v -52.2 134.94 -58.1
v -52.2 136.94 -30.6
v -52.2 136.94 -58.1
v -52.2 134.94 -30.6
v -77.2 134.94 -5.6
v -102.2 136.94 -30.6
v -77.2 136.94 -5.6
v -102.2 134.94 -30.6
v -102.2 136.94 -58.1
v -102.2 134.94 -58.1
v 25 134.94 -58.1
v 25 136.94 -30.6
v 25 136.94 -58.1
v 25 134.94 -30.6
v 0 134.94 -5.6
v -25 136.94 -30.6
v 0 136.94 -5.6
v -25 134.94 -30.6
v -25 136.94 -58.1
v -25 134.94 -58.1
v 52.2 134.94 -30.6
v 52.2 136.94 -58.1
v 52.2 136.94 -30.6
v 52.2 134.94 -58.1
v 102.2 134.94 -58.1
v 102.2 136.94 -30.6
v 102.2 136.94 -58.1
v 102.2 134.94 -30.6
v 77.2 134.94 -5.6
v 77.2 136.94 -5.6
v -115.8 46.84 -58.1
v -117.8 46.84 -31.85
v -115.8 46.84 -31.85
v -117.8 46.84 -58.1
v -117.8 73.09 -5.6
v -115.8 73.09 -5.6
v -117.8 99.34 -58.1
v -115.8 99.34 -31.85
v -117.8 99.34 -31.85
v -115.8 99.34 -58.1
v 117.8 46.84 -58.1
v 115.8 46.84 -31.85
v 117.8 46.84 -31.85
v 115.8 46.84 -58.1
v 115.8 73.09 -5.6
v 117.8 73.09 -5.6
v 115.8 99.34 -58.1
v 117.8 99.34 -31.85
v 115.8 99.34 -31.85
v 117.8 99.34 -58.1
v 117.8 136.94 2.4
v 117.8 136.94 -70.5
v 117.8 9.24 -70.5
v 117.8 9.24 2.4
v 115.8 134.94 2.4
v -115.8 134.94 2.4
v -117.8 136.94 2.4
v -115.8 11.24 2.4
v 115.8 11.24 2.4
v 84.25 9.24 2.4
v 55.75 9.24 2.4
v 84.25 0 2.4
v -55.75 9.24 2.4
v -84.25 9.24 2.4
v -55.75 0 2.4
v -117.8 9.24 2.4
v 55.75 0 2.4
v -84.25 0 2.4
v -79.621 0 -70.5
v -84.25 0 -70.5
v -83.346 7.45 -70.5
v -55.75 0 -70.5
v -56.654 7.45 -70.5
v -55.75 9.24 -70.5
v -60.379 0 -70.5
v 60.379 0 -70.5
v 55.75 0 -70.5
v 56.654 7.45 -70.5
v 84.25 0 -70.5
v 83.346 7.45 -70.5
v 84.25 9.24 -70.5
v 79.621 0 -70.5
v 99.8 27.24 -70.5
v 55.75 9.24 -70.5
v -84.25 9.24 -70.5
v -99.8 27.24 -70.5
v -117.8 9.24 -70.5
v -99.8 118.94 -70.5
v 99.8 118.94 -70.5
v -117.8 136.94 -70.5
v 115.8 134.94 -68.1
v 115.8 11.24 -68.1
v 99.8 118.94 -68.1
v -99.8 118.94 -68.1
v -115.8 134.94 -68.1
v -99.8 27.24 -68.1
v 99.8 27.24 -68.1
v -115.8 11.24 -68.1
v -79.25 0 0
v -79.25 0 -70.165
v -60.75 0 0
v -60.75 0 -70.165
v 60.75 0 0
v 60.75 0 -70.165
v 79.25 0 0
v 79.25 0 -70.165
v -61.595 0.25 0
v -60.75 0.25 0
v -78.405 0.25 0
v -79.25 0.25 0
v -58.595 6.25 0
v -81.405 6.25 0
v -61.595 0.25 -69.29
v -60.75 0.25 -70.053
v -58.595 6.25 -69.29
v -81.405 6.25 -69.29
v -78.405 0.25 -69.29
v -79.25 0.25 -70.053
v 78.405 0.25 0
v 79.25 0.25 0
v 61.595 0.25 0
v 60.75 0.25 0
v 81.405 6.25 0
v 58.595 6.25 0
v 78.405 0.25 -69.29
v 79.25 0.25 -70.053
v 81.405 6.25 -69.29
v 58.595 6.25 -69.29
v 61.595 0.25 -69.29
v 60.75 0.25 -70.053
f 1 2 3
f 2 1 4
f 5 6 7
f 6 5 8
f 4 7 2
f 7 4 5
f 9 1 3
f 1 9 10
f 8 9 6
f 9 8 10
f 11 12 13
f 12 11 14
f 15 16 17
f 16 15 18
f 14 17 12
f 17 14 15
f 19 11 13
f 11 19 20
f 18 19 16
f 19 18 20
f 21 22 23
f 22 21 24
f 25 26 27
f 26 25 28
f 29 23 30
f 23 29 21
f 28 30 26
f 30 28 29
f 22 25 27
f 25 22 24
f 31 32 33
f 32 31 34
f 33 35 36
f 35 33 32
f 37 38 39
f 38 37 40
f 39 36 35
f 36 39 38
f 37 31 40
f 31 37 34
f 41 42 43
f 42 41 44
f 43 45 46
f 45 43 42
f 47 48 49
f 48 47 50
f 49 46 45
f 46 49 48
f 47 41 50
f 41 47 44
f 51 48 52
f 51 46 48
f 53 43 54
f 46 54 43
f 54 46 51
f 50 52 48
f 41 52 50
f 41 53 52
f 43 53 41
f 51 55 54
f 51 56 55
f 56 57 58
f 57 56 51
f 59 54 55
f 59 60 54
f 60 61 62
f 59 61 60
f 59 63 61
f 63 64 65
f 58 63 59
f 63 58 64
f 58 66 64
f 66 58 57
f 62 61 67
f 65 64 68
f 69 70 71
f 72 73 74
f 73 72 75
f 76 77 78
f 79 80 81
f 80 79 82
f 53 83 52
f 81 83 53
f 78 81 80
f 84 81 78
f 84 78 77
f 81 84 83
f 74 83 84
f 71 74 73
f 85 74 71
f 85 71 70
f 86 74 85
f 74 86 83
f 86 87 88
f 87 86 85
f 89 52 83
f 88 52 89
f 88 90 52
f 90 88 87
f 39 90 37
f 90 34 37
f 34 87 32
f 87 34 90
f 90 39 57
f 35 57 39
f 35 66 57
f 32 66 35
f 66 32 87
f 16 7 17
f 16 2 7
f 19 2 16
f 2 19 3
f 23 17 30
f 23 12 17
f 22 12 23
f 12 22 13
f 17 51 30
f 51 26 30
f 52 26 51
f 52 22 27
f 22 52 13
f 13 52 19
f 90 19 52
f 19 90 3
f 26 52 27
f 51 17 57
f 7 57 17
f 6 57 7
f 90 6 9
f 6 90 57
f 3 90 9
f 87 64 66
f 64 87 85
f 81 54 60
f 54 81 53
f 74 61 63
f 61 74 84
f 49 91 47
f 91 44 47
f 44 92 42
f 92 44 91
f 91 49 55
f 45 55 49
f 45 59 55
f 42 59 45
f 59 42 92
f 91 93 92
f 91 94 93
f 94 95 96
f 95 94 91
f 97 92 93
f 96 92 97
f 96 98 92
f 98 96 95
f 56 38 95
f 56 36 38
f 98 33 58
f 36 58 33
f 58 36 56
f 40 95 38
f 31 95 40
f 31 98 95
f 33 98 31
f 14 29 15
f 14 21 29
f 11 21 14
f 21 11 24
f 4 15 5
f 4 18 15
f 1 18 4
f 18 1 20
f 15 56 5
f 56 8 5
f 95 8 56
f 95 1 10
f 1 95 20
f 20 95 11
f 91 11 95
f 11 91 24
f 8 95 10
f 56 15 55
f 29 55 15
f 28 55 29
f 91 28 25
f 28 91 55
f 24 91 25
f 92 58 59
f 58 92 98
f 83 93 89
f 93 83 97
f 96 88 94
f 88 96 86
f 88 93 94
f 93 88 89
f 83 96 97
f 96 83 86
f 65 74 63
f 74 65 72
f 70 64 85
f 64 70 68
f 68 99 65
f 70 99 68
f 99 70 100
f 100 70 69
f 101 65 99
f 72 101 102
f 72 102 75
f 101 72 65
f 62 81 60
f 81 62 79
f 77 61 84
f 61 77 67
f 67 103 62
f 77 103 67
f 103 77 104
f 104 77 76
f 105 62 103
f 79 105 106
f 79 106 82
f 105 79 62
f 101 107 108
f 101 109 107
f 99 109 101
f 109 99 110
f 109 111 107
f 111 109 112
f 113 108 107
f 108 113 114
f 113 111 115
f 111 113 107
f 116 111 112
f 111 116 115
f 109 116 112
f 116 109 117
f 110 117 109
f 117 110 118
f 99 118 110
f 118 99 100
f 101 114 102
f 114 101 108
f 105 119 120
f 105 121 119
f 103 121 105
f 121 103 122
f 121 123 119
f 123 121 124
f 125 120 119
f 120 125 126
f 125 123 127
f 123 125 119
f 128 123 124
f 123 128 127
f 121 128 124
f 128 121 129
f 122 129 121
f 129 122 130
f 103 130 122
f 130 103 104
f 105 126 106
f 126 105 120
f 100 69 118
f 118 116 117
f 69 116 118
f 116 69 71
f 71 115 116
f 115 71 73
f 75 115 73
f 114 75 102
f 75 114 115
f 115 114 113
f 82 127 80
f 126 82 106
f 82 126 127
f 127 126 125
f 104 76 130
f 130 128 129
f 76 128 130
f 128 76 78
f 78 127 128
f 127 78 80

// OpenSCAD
// file: rail-clip.scad
// Bunk rail system, shared library.
//
// A rail clip hooks over a bed's top guardrail rail. Its plate carries a
// vertical dovetail tail; every accessory (cup, tissue box, cubby, and
// later a wardrobe rod or hooks) has a matching socket on its back. The
// socket is open at the bottom and capped by a roof at the top: you lower
// the accessory from above, the tail enters through the socket's bottom
// mouth, and the roof comes down onto the tail's top end. Weight and a
// dropped cup push the roof harder onto the tail, so a load can't slide
// the accessory off; only lifting it does. Wide accessories take two or
// more clips.
//
// (Before 2026-11-12 the stop was a floor at the socket's bottom, which
// meant the accessory went on by being pushed UP and any downward load
// slid it off. pipeline/print-check's retention check now fails that.)
//
// Defaults are the owner's caliper readings (2026-11-08) of a Bellemave
// twin low loft (FST00301-TB-AH): top rail 20.74 front-to-back x 20.38
// tall, lower rails about 15.5 tall x 20.18, 80.54 from the top rail's
// bottom to the next rail's top. The owner reports the rails are 80 apart
// all the way down.
//
// Clip axes: X runs along the rail, Y points away from the rail toward
// the accessory, Z is up. The top rail's bottom face is z = 0 and its
// accessory-side face is y = 0. Inside or outside the bed is the same
// part turned the other way round.
//
// Accessory axes: X along the rail, Y away from the clip, Z up. The
// accessory's back face is y = 0 and the underside of the socket roof
// (where the tail's top end bears) is z = 0. The roof is z = 0 to
// dt_roof(); the accessory hangs below.

// ---- dovetail interface (keep these fixed so all parts interchange) ----
function dt_base() = 16;    // tail width at the plate
function dt_tip() = 22;     // tail width at its face
function dt_depth() = 6;    // how far the tail stands off the plate
function dt_wall() = 3;     // accessory material around the socket
function dt_roof() = 2.4;   // socket roof over the tail's top end; carries the load
function dt_block_w(c) = dt_tip() + 2 * c + 2 * dt_wall();
function dt_block_d(c) = dt_depth() + c + dt_wall();

module dt_profile() {
  polygon([[-dt_base() / 2, 0], [dt_base() / 2, 0],
           [dt_tip() / 2, dt_depth()], [-dt_tip() / 2, dt_depth()]]);
}

// male tail on the clip, standing on y = 0, from z0 to z1
module dt_tail(z0, z1) {
  translate([0, 0, z0]) linear_extrude(z1 - z0) dt_profile();
}

// socket cut, clearance c on every mating face, open through y < 0
module dt_socket(z0, z1, c) {
  translate([0, 0, z0]) linear_extrude(z1 - z0) union() {
    offset(delta = c) dt_profile();
    translate([-dt_base() / 2 - c - 1, -1]) square([dt_base() + 2 * c + 2, 1 + c]);
  }
}

// Give an accessory its mount block(s) and socket(s). Children are the
// accessory body, starting at y = dt_block_d(c). The block runs from
// z = -h up to the roof's top (dt_roof()); its socket is open at the
// bottom and stops at the roof. h is how much tail the socket takes; a
// longer tail just shows below the block. xs are the socket centers along
// X (a clip each).
module with_mounts(h, c = 0.25, xs = [0]) {
  bw = dt_block_w(c);
  bd = dt_block_d(c);
  assert(h >= 30, str("with_mounts: only ", h, " mm of tail engaged; 30 is the minimum"));
  difference() {
    union() {
      children();
      for (x = xs) translate([x - bw / 2, 0, -h]) cube([bw, bd + 0.01, h + dt_roof()]);
    }
    for (x = xs) translate([x, 0, 0]) dt_socket(-h - 1, 0, c);
    // 45 deg lead-in chamfer at each socket's bottom mouth
    for (x = xs) translate([x, 0, 0]) hull() {
      translate([0, 0, -h - 0.01]) linear_extrude(0.01) offset(delta = c + 1.2) dt_profile();
      translate([0, 0, -h + 1.2]) linear_extrude(0.01) offset(delta = c) dt_profile();
    }
  }
}

// ---- clip ----
function clip_top(rail_h = 20.38, wall = 3) = rail_h + wall;
function clip_foot(rail_gap = 80.54, brace = 7.5) = -(rail_gap + brace);
function clip_mount_y(clear = 0.4, wall = 3) = clear / 2 + wall;

module rail_clip(rail_d = 20.74, rail_h = 20.38, rail_gap = 80.54,
                 hook_w = 40, wall = 3, leg_t = 2.5, lip = 1.0, lip_h = 2.5,
                 brace = 7.5, clear = 0.4, eps = 0.01,
                 catch = "none", low_h = 15.42, low_d = 15.42, low_set = 2.47, pad_clear = 0.3,
                 catch_clear = 0.6, catch_reach = 1.5, catch_t = 2.5,
                 nub_h = 2, nub_t = 2.5, wrap = false, min_tail = 34) {
  // The clip hangs from one rail (rail_d x rail_h) and catches the next one
  // down (low_d x low_h, rail_gap below, its near face low_set behind this
  // rail's; negative low_set = in front of it). wrap = true: a clip for a
  // single bar; the J catches under the same bar it hangs from, and a short
  // far lip replaces the far leg so it rocks on.
  g  = wrap ? -rail_h : rail_gap;
  lh = wrap ? rail_h : low_h;
  ld = wrap ? rail_d : low_d;
  ls = wrap ? 0 : low_set;
  top_z = clip_top(rail_h, wall);
  foot_z = clip_foot(g, brace);
  near_y = clear / 2;
  far_y = -(rail_d + clear / 2);
  low_face = -ls;                                // next rail's near face
  // the plate stands off whichever face sticks out further
  plate_y = wrap ? near_y : max(near_y, low_face + pad_clear);
  // catch = "hook": a lip snaps under the next rail's near edge; flat top
  // face holds, 45 deg ramp underneath so the plate flexes over the rails.
  // Printed saddle-down the flat face is a ledge over air of about
  // catch_reach (1.5 = owner's pick, 2026-11-16).
  catch_z = -(g + lh) - catch_clear;             // underside of the next rail, plus play
  tip_y = low_face - catch_reach;
  ramp = plate_y - tip_y;
  // catch = "j" (owner's pick, 2026-11-18): a shelf runs right under the
  // next rail, across its full depth, and a nub_h nub turns up behind its
  // far face. It goes on by hooking under first and rocking up over the
  // hanging rail. Printed saddle-down, shelf and nub need supports.
  j_far = low_face - ld - catch_clear;           // shelf's far end, behind the next rail
  catch_bot = catch == "hook" ? catch_z - catch_t - ramp
            : catch == "j" ? catch_z - catch_t - 4 : foot_z;
  // long enough for an accessory's 30 mm of socket, whatever the catch
  plate_z = min(catch_bot, top_z - min_tail);
  assert(catch == "none" || catch == "hook" || catch == "j", str("rail_clip: unknown catch ", catch));
  assert(!wrap || catch == "j", "rail_clip: a single-bar clip (wrap) needs catch = \"j\"");
  // spacer between the plate and this rail's face, when the next rail sticks out further
  if (plate_y > near_y + 0.2) translate([-hook_w / 2, near_y - eps, 0]) cube([hook_w, plate_y - near_y + 2 * eps, rail_h + eps]);
  // pad on the plate's inside that rests on the next rail's face (pad_clear
  // play) when that rail sits behind this one. 45 deg ends.
  pad = plate_y - (low_face + pad_clear);
  if (!wrap && pad > 0.2) translate([hook_w / 2, 0, 0]) rotate([0, -90, 0]) linear_extrude(hook_w)
    // with a catch the pad runs on down into it (no notch for a ledge to hang off)
    let(pb = catch == "none" ? max(-(g + lh), plate_z + pad) : catch_z - eps)
    polygon([[-g + pad, plate_y + eps], [-g, plate_y - pad], [pb, plate_y - pad],
             catch == "none" ? [pb - pad, plate_y + eps] : [pb, plate_y + eps]]);
  translate([-hook_w / 2, plate_y, plate_z]) cube([hook_w, wall, top_z - plate_z]);
  if (catch == "hook") translate([hook_w / 2, 0, 0]) rotate([0, -90, 0]) linear_extrude(hook_w)
    polygon([[catch_z, plate_y + eps], [catch_z, tip_y], [catch_z - catch_t, tip_y],
             [catch_z - catch_t - ramp, plate_y + eps]]);
  if (catch == "j") translate([hook_w / 2, 0, 0]) rotate([0, -90, 0]) linear_extrude(hook_w) union() {
    // shelf under the next rail, from the plate to behind its far face
    polygon([[catch_z, plate_y + eps], [catch_z, j_far - nub_t],
             [catch_z - catch_t, j_far - nub_t], [catch_z - catch_t, plate_y + eps]]);
    // nub up behind the far face, 45 deg lead-in on its outer top edge
    polygon([[catch_z - eps, j_far], [catch_z + nub_h, j_far],
             [catch_z + nub_h, j_far - nub_t + min(nub_h, nub_t) / 2], [catch_z + nub_h - min(nub_h, nub_t) / 2, j_far - nub_t],
             [catch_z - eps, j_far - nub_t]]);
    // 45 deg gusset under the shelf where it meets the plate
    polygon([[catch_z - catch_t + eps, plate_y + eps], [catch_z - catch_t + eps, plate_y - 4],
             [catch_z - catch_t - 4, plate_y + eps]]);
  }
  // saddle across the rail top
  translate([-hook_w / 2, far_y - leg_t, rail_h])
    cube([hook_w, plate_y - far_y + wall + leg_t, wall]);
  if (wrap) {
    // short far lip over the bar's far top edge (the J holds the bottom)
    translate([-hook_w / 2, far_y - leg_t, rail_h - nub_h - 1]) cube([hook_w, leg_t, nub_h + 1 + eps]);
  } else {
    // far leg down the rail's far face
    translate([-hook_w / 2, far_y - leg_t, -lip_h]) cube([hook_w, leg_t, rail_h + lip_h + eps]);
    // snap lip under the rail's far edge, lead-in chamfer on its lower face
    translate([hook_w / 2, far_y, -lip_h]) rotate([0, -90, 0]) linear_extrude(hook_w)
      polygon([[0, 0], [lip_h, 0], [lip_h, lip], [lip_h - lip, lip]]);
  }
  // dovetail tail on the plate's outer face, to the plate's bottom so a
  // catch has no thin neck (accessories just leave it showing below)
  translate([0, plate_y + wall - eps, 0]) dt_tail(plate_z, top_z);
}

// place an accessory (in accessory axes) on a default clip at x
module on_clip(x = 0, clear = 0.4, wall = 3, rail_h = 20.38) {
  translate([x, clip_mount_y(clear, wall), clip_top(rail_h, wall)])
    children();
}

// the bed's rails, for renders only (accessory side is +Y)
// next rail: 15.42 square, its near face 2.47 behind the top rail's (owner's calipers, 2026-11-16)
module rail_ghost(rail_d = 20.74, rail_h = 20.38, rail_gap = 80.54, low_d = 15.42, low_h = 15.42, low_set = 2.47) {
  color("pink", 0.5) {
    translate([-200, -rail_d, 0]) cube([400, rail_d, rail_h]);
    translate([-200, -low_set - low_d, -rail_gap - low_h]) cube([400, low_d, low_h]);
  }
}

// assembly preview: rails, clips at xs, accessory. The clip is the same
// part inside or outside the bed; it just goes on the other way round.
module bunk_assembly(xs = [0]) {
  rail_ghost();
  for (x = xs) color("orchid") translate([x, 0, 0]) rail_clip();
  color("plum") on_clip() children();
}

// pieces of the assembly one at a time, for the print-check tool
module bunk_piece(which, xs = [0]) {
  if (which == "rails") rail_ghost();
  else if (which == "clips") for (x = xs) translate([x, 0, 0]) rail_clip();
  else if (which == "mounted") on_clip() children();
}
// main file
// Bunk tissue box holder: an open-top tray that slides onto rail clips
// (clip.scad), lowered on from above, and holds a flat tissue box lying down, long side along the
// rail, so tissues pull from its top. A hole in the floor lets you push
// the box up to swap it.
//
// Box defaults are the Costco Kleenex Trusted Care flat box (230 ct,
// Costco item 723675). Kleenex lists the 200-230 ct flat box at
// 8.875 x 4.75 x 4.625 in; Target's listing says 9.00 long. The larger
// of each is used here. Measure yours and change the Box values if needed.
//
// Print upright as modeled, no supports: the floor sits on the bed and
// the windows have 45 deg pointed tops.

use <rail-clip.scad>

/* [Box, measure yours] */
box_l = 228.6;    // 9.00 in, along the rail
box_w = 120.7;    // 4.75 in, away from the rail
box_h = 117.5;    // 4.625 in
box_clear = 3;    // added to length and width
hold = 0.6;       // fraction of the box height the tray walls cover

/* [Tray] */
tray_wall = 2;
floor_t = 2.4;
ledge = 16;       // floor rim the box sits on; the middle is open
windows = true;
clips = 2;        // 1 or 2 rail clips
clip_pitch = 140; // clip spacing when using 2; must miss the bed's posts

/* [Fit] */
dt_clear = 0.25;

part = "holder"; // [holder, assembly, rails, clips, mounted]

/* [Hidden] */
eps = 0.01;

il = box_l + box_clear;
iw = box_w + box_clear;
ol = il + 2 * tray_wall;
y0 = dt_block_d(dt_clear) - eps;
ow = iw + 2 * tray_wall;
th = floor_t + box_h * hold;             // tray height
bot = dt_roof() - th;                    // tray top flush with the socket roof
xs = clips >= 2 ? [-clip_pitch / 2, clip_pitch / 2] : [0];

module win(w, h, len) {
  // pointed-top window in the XZ plane, cut through len along Y
  rotate([90, 0, 0]) translate([0, 0, -len / 2]) linear_extrude(len)
    polygon([[-w / 2, 0], [w / 2, 0], [w / 2, h], [0, h + w / 2], [-w / 2, h]]);
}

module tray() {
  wz = bot + floor_t + 10;
  room = bot + th - 8 - wz;              // window height available
  difference() {
    translate([-ol / 2, y0, bot]) cube([ol, ow, th]);
    translate([-il / 2, y0 + tray_wall, bot + floor_t]) cube([il, iw, th]);
    translate([-il / 2 + ledge, y0 + tray_wall + ledge, bot - 1])
      cube([il - 2 * ledge, iw - 2 * ledge, floor_t + 2]);
    if (windows && room > 20) {
      // front wall: three windows; side walls: one each
      fw = min(50, room);
      for (i = [-1, 0, 1]) translate([i * il / 3, y0 + ow, wz]) win(fw, room - fw / 2, 8);
      sw = min(iw * 0.5, room);
      for (s = [-1, 1]) translate([s * ol / 2, y0 + ow / 2, wz]) rotate([0, 0, 90])
        win(sw, room - sw / 2, 8);
    }
  }
}

module holder() { with_mounts(-bot, dt_clear, xs) tray(); }

if (part == "assembly") bunk_assembly(xs) holder();
else if (part == "holder") holder();
else bunk_piece(part, xs) holder();
